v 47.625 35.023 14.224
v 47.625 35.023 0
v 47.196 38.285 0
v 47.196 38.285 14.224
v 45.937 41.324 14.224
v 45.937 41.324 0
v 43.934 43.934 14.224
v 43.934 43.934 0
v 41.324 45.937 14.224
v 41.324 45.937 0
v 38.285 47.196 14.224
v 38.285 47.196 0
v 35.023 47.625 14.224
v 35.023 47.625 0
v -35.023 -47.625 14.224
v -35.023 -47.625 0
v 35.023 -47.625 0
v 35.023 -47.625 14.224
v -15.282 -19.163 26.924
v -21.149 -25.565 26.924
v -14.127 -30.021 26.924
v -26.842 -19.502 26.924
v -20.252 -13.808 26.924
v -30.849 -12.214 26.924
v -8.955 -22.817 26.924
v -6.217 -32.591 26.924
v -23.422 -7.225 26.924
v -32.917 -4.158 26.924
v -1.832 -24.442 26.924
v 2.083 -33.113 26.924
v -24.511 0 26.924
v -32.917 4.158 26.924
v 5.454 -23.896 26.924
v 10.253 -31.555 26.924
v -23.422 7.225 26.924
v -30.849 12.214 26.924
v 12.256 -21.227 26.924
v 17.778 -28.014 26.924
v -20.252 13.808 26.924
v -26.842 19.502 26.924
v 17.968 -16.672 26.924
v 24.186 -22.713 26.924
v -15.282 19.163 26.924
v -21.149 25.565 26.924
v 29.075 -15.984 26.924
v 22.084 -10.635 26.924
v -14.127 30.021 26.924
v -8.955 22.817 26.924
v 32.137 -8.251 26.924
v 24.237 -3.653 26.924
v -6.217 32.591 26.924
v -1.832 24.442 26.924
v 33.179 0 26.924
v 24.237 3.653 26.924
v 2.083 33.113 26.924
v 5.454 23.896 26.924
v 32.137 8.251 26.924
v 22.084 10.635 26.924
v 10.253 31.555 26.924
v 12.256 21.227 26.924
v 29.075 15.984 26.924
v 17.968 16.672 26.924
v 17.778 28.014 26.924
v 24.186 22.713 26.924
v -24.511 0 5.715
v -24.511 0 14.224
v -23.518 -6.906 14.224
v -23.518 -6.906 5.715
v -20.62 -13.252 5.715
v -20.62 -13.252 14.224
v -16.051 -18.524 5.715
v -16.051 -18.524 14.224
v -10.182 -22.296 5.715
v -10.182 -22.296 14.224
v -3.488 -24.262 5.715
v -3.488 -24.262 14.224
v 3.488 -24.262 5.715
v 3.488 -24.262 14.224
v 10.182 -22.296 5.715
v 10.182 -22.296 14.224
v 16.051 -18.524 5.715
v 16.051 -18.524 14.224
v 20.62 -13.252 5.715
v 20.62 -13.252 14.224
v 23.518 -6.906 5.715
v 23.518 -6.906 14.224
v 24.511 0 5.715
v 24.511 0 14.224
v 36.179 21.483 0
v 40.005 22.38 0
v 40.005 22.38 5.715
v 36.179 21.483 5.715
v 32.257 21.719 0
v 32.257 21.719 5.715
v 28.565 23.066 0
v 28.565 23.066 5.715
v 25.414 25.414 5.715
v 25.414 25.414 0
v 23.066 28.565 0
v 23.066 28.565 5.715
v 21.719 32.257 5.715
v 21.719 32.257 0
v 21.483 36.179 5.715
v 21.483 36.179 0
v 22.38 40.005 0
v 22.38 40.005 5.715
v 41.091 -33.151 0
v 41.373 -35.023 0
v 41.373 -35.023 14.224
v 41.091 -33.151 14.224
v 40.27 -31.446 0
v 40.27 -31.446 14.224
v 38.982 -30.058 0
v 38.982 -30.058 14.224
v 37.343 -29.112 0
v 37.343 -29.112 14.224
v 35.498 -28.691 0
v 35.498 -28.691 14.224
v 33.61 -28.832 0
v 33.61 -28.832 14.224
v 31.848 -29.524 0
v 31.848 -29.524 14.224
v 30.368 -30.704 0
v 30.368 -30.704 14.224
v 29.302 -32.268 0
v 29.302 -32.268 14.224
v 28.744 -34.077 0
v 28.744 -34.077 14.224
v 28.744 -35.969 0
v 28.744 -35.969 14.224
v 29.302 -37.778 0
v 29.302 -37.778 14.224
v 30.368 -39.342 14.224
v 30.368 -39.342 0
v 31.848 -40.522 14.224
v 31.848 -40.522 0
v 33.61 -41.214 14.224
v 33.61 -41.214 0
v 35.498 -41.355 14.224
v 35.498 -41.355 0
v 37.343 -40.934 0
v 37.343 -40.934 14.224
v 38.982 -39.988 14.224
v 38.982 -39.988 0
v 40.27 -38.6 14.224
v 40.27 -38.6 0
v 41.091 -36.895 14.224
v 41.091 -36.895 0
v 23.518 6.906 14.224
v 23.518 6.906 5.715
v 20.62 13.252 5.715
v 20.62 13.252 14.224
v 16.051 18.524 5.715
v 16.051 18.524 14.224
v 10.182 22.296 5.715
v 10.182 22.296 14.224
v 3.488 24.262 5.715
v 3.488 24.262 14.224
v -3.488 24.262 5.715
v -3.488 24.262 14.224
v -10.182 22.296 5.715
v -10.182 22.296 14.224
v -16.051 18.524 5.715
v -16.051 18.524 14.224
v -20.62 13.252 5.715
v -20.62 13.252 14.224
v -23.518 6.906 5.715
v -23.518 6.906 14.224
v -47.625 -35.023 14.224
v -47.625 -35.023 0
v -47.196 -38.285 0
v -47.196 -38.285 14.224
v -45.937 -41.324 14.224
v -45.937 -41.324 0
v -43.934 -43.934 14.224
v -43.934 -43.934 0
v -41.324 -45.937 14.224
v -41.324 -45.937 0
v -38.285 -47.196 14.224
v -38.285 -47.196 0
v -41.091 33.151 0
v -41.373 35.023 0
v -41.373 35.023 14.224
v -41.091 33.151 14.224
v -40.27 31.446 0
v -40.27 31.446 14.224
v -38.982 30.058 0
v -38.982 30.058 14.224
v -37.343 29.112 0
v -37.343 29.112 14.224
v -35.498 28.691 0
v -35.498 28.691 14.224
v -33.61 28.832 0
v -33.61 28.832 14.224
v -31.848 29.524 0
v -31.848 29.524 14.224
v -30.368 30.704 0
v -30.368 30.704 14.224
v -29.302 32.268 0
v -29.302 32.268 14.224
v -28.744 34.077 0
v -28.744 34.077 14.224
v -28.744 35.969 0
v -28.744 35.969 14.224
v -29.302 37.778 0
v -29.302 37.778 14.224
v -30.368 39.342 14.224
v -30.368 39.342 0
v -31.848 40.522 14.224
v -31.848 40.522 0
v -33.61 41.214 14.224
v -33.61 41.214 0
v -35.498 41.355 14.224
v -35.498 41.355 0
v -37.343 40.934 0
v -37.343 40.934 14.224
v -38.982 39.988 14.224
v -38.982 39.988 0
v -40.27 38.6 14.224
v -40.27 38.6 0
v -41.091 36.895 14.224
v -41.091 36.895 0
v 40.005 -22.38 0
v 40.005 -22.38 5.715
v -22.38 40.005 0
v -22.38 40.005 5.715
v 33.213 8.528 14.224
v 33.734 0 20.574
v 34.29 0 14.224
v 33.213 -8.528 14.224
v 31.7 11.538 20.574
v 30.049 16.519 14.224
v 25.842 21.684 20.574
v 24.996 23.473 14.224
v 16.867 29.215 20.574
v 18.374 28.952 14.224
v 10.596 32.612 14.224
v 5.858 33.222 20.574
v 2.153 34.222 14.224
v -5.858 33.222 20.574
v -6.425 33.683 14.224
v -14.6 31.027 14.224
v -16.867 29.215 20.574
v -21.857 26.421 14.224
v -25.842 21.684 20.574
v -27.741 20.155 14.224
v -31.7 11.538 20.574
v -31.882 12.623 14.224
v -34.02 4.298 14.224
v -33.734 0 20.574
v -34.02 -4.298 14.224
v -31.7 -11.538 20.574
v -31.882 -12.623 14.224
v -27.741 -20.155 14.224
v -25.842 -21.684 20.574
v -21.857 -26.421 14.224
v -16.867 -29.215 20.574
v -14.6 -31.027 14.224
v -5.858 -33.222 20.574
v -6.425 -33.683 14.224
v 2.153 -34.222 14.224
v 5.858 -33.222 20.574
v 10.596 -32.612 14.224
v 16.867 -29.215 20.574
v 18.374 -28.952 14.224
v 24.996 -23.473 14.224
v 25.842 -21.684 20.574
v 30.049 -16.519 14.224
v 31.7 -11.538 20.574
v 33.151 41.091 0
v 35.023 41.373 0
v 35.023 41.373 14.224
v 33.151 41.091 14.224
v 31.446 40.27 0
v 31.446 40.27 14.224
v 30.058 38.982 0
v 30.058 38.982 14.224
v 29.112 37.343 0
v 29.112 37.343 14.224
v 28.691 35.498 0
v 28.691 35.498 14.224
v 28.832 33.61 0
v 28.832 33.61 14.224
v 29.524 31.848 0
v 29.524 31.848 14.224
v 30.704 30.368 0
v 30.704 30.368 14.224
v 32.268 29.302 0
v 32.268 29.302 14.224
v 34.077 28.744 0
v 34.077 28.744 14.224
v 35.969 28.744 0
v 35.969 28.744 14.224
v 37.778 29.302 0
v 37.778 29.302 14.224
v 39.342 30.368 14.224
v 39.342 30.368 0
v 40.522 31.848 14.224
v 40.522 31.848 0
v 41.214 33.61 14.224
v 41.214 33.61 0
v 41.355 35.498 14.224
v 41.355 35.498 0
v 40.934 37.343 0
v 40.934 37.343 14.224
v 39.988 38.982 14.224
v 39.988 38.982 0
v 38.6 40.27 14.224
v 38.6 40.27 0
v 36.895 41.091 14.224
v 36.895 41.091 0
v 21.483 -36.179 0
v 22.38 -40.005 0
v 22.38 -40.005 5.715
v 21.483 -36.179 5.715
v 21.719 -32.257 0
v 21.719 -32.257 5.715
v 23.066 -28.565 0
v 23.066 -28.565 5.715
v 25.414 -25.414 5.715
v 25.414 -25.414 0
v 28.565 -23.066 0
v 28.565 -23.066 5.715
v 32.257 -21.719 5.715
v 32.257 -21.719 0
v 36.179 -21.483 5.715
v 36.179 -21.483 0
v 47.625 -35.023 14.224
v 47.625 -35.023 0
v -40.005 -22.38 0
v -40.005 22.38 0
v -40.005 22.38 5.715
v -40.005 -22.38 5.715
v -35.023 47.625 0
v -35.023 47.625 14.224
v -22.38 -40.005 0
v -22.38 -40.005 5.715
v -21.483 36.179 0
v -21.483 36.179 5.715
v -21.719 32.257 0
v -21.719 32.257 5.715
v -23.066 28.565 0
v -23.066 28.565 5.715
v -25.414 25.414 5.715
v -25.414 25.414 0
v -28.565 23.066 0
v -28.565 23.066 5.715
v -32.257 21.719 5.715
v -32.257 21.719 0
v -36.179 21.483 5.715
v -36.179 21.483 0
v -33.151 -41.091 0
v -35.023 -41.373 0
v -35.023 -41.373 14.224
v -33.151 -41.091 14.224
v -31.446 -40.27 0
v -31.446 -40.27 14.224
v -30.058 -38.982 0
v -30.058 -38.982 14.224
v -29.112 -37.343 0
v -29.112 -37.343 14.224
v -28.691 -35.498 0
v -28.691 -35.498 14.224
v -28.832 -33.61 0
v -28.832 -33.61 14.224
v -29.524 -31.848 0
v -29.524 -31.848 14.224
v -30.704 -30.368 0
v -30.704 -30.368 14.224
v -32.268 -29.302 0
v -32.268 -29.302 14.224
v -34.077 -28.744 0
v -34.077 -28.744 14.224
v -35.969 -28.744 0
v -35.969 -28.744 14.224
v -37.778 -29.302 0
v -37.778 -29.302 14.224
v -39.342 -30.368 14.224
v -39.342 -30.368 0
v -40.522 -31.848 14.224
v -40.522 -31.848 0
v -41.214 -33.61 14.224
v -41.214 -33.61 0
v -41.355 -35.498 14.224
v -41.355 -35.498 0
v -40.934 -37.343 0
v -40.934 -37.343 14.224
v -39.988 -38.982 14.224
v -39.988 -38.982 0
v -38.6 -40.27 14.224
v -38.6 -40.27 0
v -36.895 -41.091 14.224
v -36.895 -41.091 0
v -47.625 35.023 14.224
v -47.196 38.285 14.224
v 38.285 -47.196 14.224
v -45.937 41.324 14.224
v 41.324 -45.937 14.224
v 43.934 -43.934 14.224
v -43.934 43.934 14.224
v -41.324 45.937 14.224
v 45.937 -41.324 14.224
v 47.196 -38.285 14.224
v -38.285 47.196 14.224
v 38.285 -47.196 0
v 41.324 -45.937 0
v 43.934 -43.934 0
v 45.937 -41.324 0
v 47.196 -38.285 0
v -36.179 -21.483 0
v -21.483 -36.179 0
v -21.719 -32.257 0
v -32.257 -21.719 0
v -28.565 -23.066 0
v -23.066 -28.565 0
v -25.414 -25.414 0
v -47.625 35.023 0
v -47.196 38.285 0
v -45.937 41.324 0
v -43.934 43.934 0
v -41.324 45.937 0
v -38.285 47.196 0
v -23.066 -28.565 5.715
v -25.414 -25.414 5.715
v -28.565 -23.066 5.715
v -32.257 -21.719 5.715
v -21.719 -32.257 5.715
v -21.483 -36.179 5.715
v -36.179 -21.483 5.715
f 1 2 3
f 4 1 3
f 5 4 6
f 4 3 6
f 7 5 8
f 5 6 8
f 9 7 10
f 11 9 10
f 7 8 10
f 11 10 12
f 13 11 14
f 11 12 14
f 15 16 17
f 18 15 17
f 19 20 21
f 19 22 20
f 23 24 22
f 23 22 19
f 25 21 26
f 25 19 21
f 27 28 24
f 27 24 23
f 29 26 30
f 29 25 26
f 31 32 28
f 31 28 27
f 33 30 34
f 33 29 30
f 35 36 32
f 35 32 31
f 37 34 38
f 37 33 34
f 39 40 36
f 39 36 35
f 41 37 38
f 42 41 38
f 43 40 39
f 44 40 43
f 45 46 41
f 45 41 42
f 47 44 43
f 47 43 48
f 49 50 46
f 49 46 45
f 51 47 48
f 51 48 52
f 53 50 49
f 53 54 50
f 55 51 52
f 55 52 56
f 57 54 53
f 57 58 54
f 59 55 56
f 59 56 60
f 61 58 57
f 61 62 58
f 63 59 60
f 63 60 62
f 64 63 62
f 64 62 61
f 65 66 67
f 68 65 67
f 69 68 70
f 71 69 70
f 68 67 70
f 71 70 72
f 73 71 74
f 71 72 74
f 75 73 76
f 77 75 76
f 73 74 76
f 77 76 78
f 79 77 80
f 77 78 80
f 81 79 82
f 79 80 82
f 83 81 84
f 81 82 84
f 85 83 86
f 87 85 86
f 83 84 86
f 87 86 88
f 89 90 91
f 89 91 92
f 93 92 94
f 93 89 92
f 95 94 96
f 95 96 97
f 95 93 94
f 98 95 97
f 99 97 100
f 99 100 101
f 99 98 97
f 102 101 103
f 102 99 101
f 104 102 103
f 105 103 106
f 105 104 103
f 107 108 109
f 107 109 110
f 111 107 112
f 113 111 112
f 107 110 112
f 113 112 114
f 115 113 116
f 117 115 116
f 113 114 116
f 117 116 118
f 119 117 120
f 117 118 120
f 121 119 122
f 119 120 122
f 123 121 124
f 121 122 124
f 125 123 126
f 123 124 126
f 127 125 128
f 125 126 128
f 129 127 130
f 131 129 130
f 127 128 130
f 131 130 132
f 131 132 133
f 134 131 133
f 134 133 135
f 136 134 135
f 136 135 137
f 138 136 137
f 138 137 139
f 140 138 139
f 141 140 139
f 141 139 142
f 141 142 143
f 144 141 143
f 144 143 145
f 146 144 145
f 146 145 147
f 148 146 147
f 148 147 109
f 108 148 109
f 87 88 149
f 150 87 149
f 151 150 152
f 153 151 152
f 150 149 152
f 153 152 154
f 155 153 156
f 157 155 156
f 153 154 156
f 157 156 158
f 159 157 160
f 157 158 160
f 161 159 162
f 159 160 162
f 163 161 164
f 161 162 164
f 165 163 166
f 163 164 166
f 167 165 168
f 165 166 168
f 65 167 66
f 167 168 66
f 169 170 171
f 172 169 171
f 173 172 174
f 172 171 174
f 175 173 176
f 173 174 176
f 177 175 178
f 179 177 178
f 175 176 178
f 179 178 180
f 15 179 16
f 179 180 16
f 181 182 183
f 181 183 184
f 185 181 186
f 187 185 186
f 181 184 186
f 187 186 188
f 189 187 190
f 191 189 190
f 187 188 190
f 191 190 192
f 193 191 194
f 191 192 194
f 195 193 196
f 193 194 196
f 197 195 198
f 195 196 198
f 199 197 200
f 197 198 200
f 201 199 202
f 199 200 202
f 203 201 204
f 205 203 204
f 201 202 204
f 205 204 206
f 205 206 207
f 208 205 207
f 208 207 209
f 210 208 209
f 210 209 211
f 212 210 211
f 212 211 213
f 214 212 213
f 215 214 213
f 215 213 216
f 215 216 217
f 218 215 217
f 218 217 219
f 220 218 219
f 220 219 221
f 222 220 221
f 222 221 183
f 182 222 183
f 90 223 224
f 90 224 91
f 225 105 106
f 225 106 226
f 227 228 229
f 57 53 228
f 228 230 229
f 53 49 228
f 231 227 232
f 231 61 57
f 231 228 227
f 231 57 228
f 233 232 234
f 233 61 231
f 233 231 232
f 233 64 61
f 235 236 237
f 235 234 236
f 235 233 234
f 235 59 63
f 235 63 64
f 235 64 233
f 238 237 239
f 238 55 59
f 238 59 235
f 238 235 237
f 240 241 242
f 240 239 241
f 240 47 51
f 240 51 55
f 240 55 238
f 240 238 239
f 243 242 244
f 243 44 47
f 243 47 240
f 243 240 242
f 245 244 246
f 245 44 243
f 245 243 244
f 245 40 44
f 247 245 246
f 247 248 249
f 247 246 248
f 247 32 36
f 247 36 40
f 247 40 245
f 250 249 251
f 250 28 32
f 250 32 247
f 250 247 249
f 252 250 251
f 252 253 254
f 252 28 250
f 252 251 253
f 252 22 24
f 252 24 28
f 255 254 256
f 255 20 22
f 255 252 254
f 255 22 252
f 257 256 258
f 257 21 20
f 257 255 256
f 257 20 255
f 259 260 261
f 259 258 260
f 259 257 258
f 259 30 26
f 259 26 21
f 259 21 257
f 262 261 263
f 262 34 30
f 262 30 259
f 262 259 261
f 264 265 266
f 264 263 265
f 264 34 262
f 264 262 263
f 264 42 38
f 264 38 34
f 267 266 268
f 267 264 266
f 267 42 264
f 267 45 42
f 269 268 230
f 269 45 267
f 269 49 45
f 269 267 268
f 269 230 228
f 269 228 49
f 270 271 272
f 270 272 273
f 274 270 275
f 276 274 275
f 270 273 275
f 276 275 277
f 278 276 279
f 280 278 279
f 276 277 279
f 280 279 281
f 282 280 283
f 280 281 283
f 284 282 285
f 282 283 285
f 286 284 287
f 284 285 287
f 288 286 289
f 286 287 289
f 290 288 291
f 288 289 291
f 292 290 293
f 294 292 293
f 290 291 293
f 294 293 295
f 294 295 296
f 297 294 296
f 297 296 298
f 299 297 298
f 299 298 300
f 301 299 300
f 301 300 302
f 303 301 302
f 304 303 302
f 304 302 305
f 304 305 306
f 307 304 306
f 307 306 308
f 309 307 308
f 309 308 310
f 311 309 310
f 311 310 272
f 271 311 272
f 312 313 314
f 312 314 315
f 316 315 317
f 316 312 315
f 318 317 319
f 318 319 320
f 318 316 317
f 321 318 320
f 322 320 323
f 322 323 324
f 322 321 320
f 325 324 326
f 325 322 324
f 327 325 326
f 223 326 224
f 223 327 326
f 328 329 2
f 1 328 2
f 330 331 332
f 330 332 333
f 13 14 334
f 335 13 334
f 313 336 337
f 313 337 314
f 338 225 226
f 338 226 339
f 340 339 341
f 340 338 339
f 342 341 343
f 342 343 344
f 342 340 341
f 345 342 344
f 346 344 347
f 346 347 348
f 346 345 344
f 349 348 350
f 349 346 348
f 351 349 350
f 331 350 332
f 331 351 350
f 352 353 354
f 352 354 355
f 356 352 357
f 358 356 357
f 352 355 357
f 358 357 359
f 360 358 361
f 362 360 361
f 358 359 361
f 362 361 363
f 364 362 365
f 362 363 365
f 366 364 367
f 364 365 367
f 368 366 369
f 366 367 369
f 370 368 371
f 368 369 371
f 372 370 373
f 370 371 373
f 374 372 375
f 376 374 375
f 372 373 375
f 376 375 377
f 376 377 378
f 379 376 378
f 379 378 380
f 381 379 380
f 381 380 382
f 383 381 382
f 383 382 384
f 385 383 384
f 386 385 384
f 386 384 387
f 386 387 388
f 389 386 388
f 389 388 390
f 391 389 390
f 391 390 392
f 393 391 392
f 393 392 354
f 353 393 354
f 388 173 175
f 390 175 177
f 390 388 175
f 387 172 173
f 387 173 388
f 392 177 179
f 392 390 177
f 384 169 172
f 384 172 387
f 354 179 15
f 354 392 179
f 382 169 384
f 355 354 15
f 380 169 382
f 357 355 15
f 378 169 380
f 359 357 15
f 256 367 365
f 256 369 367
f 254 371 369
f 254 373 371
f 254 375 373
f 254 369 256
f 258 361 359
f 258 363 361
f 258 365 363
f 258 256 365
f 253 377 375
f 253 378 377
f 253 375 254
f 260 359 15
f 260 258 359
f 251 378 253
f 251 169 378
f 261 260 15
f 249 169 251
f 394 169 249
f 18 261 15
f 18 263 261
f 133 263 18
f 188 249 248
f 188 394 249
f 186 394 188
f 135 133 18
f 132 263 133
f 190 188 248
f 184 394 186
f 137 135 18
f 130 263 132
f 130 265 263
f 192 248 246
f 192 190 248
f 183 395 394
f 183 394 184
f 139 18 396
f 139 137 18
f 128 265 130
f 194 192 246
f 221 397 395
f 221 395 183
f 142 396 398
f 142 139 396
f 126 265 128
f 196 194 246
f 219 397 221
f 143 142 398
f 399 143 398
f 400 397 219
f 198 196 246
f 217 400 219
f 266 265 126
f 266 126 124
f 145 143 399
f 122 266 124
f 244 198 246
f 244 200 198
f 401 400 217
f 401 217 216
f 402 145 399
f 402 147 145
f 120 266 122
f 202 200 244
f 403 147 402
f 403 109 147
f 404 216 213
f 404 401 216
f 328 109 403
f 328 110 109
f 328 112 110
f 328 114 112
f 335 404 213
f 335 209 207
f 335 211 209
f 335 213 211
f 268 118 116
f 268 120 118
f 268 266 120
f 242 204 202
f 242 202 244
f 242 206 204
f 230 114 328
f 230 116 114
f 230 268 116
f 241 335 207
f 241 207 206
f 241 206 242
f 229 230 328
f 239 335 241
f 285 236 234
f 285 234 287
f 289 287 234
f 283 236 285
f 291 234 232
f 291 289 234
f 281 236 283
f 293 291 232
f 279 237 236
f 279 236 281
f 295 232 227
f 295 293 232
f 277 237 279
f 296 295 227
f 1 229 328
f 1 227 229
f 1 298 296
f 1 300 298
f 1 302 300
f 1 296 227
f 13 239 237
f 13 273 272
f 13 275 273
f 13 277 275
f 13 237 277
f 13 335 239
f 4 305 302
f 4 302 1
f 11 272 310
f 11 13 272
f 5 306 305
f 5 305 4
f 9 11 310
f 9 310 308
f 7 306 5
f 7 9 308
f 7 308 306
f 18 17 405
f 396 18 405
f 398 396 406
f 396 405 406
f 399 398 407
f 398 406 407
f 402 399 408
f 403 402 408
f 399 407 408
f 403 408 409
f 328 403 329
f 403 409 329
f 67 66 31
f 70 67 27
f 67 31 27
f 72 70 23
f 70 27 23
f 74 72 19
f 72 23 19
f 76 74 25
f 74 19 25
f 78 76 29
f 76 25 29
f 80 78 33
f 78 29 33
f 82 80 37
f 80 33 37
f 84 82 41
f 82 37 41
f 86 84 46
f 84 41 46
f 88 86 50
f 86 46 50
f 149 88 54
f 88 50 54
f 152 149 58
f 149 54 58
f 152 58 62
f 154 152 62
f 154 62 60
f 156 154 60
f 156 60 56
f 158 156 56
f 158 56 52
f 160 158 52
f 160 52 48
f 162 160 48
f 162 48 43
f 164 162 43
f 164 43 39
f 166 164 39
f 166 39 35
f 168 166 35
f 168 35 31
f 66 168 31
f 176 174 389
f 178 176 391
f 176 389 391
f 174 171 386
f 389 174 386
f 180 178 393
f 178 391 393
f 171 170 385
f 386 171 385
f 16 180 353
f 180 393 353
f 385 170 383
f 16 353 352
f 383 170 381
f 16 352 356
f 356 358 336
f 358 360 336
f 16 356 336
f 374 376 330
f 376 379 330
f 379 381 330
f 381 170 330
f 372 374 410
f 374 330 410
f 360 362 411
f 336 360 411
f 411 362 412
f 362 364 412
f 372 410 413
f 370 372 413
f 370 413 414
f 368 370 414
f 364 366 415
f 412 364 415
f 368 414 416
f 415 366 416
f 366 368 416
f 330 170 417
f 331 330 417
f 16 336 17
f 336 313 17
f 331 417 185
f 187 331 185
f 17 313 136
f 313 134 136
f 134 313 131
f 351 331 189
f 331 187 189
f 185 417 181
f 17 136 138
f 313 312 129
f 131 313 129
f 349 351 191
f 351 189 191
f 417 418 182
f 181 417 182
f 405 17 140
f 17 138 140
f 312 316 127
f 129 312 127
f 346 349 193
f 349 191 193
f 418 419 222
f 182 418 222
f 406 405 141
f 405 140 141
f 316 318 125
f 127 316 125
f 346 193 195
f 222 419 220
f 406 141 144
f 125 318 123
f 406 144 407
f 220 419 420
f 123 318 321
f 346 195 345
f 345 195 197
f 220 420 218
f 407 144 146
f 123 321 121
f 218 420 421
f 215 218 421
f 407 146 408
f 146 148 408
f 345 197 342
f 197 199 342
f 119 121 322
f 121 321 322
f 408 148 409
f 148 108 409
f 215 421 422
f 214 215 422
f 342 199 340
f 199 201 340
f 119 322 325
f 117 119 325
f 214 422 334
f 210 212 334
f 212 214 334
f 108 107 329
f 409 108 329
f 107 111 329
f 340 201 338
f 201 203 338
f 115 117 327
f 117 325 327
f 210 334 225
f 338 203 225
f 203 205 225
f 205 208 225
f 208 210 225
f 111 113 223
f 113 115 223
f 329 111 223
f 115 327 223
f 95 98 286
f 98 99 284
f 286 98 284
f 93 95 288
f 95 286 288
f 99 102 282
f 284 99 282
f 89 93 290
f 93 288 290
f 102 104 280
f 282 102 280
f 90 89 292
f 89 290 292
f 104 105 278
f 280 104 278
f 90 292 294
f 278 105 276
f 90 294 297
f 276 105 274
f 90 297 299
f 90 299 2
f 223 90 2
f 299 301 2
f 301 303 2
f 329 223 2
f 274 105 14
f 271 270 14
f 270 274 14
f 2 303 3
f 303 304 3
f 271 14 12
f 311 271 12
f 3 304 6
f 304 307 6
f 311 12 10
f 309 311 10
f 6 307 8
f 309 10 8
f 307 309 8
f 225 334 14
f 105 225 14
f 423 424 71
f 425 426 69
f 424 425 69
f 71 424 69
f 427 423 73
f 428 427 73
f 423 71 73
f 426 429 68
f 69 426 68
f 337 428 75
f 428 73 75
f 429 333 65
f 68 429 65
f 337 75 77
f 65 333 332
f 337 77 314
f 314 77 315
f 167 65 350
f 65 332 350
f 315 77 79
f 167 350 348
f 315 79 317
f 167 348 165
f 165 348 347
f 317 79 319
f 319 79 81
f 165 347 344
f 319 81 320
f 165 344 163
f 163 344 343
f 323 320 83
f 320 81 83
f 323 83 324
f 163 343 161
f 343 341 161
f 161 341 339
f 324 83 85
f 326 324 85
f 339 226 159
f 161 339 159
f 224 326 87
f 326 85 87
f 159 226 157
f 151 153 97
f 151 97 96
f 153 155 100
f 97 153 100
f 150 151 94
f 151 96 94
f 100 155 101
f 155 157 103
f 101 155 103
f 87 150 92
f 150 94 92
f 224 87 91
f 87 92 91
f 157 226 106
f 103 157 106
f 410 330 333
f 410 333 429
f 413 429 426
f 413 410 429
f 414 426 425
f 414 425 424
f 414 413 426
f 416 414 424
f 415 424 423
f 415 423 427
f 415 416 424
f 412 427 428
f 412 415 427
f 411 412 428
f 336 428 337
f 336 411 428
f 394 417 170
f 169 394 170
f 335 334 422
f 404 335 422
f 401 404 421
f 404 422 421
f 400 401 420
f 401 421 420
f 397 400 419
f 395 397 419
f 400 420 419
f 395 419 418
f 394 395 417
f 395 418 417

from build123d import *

# Parameters (mm, degrees)
F1_DEPTH        = 14.224
F2_DEPTH        = 5.715
F3_D            = 12.7
F3_COPIES_COUNT = 4
F5_R            = 34.29
F6_DEPTH        = 12.7
F6_TAPER        = 5
F7_D            = 49.022
F7_DEPTH        = 14.225
F8_D            = 49.022


# Not quite as in the source:
# - a pattern or mirror of a feature is missing from the dataset's text; its kind, count and spacing are read off the source's solid


with BuildPart() as f1:
    # F0 (on Top) → F1 (new body)
    with BuildSketch(Plane.XY):
        with BuildLine():
            Line((35.0229988722, 47.625), (-35.0229988722, 47.625))
            ThreePointArc((-35.0229988722, 47.625), (-43.9339593262, 43.9339593262), (-47.625, 35.0229988722))
            Line((-47.625, 35.0229988722), (-47.625, -35.0229988722))
            ThreePointArc((-47.625, -35.0229988722), (-43.9339593262, -43.9339593262), (-35.0229988722, -47.625))
            Line((-35.0229988722, -47.625), (35.0229988722, -47.625))
            ThreePointArc((35.0229988722, -47.625), (43.9339593262, -43.9339593262), (47.625, -35.0229988722))
            Line((47.625, -35.0229988722), (47.625, 35.0229988722))
            ThreePointArc((47.625, 35.0229988722), (43.9339593262, 43.9339593262), (35.0229988722, 47.625))
        make_face()
        with BuildLine():
            Line((22.3801912029, -40.005), (-22.3801912029, -40.005))
            ThreePointArc((-22.3801912029, -40.005), (-25.4141248226, -25.4141248226), (-40.005, -22.3801912029))
            Line((-40.005, -22.3801912029), (-40.005, 22.3801912029))
            ThreePointArc((-40.005, 22.3801912029), (-25.4141248226, 25.4141248226), (-22.3801912029, 40.005))
            Line((-22.3801912029, 40.005), (22.3801912029, 40.005))
            ThreePointArc((22.3801912029, 40.005), (25.4141248226, 25.4141248226), (40.005, 22.3801912029))
            Line((40.005, 22.3801912029), (40.005, -22.3801912029))
            ThreePointArc((40.005, -22.3801912029), (25.4141248226, -25.4141248226), (22.3801912029, -40.005))
        make_face(mode=Mode.SUBTRACT)
        with BuildLine():
            ThreePointArc((-40.005, -22.3801912029), (-25.4141248226, -25.4141248226), (-22.3801912029, -40.005))
            Line((-22.3801912029, -40.005), (22.3801912029, -40.005))
            ThreePointArc((22.3801912029, -40.005), (25.4141248226, -25.4141248226), (40.005, -22.3801912029))
            Line((40.005, -22.3801912029), (40.005, 22.3801912029))
            ThreePointArc((40.005, 22.3801912029), (25.4141248226, 25.4141248226), (22.3801912029, 40.005))
            Line((22.3801912029, 40.005), (-22.3801912029, 40.005))
            ThreePointArc((-22.3801912029, 40.005), (-25.4141248226, 25.4141248226), (-40.005, 22.3801912029))
            Line((-40.005, 22.3801912029), (-40.005, -22.3801912029))
        make_face()
    extrude(amount=F1_DEPTH)

    # F0 (on Top) → F2 (cut)
    with BuildSketch(Plane.XY):
        with BuildLine():
            ThreePointArc((-40.005, -22.3801912029), (-25.4141248226, -25.4141248226), (-22.3801912029, -40.005))
            Line((-22.3801912029, -40.005), (22.3801912029, -40.005))
            ThreePointArc((22.3801912029, -40.005), (25.4141248226, -25.4141248226), (40.005, -22.3801912029))
            Line((40.005, -22.3801912029), (40.005, 22.3801912029))
            ThreePointArc((40.005, 22.3801912029), (25.4141248226, 25.4141248226), (22.3801912029, 40.005))
            Line((22.3801912029, 40.005), (-22.3801912029, 40.005))
            ThreePointArc((-22.3801912029, 40.005), (-25.4141248226, 25.4141248226), (-40.005, 22.3801912029))
            Line((-40.005, 22.3801912029), (-40.005, -22.3801912029))
        make_face()
    extrude(amount=F2_DEPTH, mode=Mode.SUBTRACT)

    # F3 (through all)
    with Locations(Plane(origin=(0, 0, 0), x_dir=(1, 0, 0), z_dir=(0, 0, -1))):
        with Locations((-35.0229988722, -35.0229988722)):
            f3 = Hole(F3_D / 2)

    # F3_copies: F3 ×4 about axis
    f3_copies_axis = Axis((0, 0, 0), (0, 0, 1))
    for i in range(1, F3_COPIES_COUNT):
        add(f3.rotate(f3_copies_axis, i * 360 / F3_COPIES_COUNT), mode=Mode.SUBTRACT)

    # F5 (on face) → F6 (join)
    with BuildSketch(Plane.XY.offset(14.224)):
        Circle(F5_R)
    extrude(amount=F6_DEPTH, taper=F6_TAPER)

    # F7 (through all, one way)
    with BuildSketch(Plane.XY.offset(14.224)):
        with Locations((0, 0)):
            Circle(F7_D / 2)
    extrude(amount=-F7_DEPTH, mode=Mode.SUBTRACT)

    # F8 (through all)
    with Locations(Plane(origin=(0, 0, 14.224), x_dir=(1, 0, 0), z_dir=(0, 0, -1))):
        with Locations((0, 0)):
            Hole(F8_D / 2)


solid = f1.part
